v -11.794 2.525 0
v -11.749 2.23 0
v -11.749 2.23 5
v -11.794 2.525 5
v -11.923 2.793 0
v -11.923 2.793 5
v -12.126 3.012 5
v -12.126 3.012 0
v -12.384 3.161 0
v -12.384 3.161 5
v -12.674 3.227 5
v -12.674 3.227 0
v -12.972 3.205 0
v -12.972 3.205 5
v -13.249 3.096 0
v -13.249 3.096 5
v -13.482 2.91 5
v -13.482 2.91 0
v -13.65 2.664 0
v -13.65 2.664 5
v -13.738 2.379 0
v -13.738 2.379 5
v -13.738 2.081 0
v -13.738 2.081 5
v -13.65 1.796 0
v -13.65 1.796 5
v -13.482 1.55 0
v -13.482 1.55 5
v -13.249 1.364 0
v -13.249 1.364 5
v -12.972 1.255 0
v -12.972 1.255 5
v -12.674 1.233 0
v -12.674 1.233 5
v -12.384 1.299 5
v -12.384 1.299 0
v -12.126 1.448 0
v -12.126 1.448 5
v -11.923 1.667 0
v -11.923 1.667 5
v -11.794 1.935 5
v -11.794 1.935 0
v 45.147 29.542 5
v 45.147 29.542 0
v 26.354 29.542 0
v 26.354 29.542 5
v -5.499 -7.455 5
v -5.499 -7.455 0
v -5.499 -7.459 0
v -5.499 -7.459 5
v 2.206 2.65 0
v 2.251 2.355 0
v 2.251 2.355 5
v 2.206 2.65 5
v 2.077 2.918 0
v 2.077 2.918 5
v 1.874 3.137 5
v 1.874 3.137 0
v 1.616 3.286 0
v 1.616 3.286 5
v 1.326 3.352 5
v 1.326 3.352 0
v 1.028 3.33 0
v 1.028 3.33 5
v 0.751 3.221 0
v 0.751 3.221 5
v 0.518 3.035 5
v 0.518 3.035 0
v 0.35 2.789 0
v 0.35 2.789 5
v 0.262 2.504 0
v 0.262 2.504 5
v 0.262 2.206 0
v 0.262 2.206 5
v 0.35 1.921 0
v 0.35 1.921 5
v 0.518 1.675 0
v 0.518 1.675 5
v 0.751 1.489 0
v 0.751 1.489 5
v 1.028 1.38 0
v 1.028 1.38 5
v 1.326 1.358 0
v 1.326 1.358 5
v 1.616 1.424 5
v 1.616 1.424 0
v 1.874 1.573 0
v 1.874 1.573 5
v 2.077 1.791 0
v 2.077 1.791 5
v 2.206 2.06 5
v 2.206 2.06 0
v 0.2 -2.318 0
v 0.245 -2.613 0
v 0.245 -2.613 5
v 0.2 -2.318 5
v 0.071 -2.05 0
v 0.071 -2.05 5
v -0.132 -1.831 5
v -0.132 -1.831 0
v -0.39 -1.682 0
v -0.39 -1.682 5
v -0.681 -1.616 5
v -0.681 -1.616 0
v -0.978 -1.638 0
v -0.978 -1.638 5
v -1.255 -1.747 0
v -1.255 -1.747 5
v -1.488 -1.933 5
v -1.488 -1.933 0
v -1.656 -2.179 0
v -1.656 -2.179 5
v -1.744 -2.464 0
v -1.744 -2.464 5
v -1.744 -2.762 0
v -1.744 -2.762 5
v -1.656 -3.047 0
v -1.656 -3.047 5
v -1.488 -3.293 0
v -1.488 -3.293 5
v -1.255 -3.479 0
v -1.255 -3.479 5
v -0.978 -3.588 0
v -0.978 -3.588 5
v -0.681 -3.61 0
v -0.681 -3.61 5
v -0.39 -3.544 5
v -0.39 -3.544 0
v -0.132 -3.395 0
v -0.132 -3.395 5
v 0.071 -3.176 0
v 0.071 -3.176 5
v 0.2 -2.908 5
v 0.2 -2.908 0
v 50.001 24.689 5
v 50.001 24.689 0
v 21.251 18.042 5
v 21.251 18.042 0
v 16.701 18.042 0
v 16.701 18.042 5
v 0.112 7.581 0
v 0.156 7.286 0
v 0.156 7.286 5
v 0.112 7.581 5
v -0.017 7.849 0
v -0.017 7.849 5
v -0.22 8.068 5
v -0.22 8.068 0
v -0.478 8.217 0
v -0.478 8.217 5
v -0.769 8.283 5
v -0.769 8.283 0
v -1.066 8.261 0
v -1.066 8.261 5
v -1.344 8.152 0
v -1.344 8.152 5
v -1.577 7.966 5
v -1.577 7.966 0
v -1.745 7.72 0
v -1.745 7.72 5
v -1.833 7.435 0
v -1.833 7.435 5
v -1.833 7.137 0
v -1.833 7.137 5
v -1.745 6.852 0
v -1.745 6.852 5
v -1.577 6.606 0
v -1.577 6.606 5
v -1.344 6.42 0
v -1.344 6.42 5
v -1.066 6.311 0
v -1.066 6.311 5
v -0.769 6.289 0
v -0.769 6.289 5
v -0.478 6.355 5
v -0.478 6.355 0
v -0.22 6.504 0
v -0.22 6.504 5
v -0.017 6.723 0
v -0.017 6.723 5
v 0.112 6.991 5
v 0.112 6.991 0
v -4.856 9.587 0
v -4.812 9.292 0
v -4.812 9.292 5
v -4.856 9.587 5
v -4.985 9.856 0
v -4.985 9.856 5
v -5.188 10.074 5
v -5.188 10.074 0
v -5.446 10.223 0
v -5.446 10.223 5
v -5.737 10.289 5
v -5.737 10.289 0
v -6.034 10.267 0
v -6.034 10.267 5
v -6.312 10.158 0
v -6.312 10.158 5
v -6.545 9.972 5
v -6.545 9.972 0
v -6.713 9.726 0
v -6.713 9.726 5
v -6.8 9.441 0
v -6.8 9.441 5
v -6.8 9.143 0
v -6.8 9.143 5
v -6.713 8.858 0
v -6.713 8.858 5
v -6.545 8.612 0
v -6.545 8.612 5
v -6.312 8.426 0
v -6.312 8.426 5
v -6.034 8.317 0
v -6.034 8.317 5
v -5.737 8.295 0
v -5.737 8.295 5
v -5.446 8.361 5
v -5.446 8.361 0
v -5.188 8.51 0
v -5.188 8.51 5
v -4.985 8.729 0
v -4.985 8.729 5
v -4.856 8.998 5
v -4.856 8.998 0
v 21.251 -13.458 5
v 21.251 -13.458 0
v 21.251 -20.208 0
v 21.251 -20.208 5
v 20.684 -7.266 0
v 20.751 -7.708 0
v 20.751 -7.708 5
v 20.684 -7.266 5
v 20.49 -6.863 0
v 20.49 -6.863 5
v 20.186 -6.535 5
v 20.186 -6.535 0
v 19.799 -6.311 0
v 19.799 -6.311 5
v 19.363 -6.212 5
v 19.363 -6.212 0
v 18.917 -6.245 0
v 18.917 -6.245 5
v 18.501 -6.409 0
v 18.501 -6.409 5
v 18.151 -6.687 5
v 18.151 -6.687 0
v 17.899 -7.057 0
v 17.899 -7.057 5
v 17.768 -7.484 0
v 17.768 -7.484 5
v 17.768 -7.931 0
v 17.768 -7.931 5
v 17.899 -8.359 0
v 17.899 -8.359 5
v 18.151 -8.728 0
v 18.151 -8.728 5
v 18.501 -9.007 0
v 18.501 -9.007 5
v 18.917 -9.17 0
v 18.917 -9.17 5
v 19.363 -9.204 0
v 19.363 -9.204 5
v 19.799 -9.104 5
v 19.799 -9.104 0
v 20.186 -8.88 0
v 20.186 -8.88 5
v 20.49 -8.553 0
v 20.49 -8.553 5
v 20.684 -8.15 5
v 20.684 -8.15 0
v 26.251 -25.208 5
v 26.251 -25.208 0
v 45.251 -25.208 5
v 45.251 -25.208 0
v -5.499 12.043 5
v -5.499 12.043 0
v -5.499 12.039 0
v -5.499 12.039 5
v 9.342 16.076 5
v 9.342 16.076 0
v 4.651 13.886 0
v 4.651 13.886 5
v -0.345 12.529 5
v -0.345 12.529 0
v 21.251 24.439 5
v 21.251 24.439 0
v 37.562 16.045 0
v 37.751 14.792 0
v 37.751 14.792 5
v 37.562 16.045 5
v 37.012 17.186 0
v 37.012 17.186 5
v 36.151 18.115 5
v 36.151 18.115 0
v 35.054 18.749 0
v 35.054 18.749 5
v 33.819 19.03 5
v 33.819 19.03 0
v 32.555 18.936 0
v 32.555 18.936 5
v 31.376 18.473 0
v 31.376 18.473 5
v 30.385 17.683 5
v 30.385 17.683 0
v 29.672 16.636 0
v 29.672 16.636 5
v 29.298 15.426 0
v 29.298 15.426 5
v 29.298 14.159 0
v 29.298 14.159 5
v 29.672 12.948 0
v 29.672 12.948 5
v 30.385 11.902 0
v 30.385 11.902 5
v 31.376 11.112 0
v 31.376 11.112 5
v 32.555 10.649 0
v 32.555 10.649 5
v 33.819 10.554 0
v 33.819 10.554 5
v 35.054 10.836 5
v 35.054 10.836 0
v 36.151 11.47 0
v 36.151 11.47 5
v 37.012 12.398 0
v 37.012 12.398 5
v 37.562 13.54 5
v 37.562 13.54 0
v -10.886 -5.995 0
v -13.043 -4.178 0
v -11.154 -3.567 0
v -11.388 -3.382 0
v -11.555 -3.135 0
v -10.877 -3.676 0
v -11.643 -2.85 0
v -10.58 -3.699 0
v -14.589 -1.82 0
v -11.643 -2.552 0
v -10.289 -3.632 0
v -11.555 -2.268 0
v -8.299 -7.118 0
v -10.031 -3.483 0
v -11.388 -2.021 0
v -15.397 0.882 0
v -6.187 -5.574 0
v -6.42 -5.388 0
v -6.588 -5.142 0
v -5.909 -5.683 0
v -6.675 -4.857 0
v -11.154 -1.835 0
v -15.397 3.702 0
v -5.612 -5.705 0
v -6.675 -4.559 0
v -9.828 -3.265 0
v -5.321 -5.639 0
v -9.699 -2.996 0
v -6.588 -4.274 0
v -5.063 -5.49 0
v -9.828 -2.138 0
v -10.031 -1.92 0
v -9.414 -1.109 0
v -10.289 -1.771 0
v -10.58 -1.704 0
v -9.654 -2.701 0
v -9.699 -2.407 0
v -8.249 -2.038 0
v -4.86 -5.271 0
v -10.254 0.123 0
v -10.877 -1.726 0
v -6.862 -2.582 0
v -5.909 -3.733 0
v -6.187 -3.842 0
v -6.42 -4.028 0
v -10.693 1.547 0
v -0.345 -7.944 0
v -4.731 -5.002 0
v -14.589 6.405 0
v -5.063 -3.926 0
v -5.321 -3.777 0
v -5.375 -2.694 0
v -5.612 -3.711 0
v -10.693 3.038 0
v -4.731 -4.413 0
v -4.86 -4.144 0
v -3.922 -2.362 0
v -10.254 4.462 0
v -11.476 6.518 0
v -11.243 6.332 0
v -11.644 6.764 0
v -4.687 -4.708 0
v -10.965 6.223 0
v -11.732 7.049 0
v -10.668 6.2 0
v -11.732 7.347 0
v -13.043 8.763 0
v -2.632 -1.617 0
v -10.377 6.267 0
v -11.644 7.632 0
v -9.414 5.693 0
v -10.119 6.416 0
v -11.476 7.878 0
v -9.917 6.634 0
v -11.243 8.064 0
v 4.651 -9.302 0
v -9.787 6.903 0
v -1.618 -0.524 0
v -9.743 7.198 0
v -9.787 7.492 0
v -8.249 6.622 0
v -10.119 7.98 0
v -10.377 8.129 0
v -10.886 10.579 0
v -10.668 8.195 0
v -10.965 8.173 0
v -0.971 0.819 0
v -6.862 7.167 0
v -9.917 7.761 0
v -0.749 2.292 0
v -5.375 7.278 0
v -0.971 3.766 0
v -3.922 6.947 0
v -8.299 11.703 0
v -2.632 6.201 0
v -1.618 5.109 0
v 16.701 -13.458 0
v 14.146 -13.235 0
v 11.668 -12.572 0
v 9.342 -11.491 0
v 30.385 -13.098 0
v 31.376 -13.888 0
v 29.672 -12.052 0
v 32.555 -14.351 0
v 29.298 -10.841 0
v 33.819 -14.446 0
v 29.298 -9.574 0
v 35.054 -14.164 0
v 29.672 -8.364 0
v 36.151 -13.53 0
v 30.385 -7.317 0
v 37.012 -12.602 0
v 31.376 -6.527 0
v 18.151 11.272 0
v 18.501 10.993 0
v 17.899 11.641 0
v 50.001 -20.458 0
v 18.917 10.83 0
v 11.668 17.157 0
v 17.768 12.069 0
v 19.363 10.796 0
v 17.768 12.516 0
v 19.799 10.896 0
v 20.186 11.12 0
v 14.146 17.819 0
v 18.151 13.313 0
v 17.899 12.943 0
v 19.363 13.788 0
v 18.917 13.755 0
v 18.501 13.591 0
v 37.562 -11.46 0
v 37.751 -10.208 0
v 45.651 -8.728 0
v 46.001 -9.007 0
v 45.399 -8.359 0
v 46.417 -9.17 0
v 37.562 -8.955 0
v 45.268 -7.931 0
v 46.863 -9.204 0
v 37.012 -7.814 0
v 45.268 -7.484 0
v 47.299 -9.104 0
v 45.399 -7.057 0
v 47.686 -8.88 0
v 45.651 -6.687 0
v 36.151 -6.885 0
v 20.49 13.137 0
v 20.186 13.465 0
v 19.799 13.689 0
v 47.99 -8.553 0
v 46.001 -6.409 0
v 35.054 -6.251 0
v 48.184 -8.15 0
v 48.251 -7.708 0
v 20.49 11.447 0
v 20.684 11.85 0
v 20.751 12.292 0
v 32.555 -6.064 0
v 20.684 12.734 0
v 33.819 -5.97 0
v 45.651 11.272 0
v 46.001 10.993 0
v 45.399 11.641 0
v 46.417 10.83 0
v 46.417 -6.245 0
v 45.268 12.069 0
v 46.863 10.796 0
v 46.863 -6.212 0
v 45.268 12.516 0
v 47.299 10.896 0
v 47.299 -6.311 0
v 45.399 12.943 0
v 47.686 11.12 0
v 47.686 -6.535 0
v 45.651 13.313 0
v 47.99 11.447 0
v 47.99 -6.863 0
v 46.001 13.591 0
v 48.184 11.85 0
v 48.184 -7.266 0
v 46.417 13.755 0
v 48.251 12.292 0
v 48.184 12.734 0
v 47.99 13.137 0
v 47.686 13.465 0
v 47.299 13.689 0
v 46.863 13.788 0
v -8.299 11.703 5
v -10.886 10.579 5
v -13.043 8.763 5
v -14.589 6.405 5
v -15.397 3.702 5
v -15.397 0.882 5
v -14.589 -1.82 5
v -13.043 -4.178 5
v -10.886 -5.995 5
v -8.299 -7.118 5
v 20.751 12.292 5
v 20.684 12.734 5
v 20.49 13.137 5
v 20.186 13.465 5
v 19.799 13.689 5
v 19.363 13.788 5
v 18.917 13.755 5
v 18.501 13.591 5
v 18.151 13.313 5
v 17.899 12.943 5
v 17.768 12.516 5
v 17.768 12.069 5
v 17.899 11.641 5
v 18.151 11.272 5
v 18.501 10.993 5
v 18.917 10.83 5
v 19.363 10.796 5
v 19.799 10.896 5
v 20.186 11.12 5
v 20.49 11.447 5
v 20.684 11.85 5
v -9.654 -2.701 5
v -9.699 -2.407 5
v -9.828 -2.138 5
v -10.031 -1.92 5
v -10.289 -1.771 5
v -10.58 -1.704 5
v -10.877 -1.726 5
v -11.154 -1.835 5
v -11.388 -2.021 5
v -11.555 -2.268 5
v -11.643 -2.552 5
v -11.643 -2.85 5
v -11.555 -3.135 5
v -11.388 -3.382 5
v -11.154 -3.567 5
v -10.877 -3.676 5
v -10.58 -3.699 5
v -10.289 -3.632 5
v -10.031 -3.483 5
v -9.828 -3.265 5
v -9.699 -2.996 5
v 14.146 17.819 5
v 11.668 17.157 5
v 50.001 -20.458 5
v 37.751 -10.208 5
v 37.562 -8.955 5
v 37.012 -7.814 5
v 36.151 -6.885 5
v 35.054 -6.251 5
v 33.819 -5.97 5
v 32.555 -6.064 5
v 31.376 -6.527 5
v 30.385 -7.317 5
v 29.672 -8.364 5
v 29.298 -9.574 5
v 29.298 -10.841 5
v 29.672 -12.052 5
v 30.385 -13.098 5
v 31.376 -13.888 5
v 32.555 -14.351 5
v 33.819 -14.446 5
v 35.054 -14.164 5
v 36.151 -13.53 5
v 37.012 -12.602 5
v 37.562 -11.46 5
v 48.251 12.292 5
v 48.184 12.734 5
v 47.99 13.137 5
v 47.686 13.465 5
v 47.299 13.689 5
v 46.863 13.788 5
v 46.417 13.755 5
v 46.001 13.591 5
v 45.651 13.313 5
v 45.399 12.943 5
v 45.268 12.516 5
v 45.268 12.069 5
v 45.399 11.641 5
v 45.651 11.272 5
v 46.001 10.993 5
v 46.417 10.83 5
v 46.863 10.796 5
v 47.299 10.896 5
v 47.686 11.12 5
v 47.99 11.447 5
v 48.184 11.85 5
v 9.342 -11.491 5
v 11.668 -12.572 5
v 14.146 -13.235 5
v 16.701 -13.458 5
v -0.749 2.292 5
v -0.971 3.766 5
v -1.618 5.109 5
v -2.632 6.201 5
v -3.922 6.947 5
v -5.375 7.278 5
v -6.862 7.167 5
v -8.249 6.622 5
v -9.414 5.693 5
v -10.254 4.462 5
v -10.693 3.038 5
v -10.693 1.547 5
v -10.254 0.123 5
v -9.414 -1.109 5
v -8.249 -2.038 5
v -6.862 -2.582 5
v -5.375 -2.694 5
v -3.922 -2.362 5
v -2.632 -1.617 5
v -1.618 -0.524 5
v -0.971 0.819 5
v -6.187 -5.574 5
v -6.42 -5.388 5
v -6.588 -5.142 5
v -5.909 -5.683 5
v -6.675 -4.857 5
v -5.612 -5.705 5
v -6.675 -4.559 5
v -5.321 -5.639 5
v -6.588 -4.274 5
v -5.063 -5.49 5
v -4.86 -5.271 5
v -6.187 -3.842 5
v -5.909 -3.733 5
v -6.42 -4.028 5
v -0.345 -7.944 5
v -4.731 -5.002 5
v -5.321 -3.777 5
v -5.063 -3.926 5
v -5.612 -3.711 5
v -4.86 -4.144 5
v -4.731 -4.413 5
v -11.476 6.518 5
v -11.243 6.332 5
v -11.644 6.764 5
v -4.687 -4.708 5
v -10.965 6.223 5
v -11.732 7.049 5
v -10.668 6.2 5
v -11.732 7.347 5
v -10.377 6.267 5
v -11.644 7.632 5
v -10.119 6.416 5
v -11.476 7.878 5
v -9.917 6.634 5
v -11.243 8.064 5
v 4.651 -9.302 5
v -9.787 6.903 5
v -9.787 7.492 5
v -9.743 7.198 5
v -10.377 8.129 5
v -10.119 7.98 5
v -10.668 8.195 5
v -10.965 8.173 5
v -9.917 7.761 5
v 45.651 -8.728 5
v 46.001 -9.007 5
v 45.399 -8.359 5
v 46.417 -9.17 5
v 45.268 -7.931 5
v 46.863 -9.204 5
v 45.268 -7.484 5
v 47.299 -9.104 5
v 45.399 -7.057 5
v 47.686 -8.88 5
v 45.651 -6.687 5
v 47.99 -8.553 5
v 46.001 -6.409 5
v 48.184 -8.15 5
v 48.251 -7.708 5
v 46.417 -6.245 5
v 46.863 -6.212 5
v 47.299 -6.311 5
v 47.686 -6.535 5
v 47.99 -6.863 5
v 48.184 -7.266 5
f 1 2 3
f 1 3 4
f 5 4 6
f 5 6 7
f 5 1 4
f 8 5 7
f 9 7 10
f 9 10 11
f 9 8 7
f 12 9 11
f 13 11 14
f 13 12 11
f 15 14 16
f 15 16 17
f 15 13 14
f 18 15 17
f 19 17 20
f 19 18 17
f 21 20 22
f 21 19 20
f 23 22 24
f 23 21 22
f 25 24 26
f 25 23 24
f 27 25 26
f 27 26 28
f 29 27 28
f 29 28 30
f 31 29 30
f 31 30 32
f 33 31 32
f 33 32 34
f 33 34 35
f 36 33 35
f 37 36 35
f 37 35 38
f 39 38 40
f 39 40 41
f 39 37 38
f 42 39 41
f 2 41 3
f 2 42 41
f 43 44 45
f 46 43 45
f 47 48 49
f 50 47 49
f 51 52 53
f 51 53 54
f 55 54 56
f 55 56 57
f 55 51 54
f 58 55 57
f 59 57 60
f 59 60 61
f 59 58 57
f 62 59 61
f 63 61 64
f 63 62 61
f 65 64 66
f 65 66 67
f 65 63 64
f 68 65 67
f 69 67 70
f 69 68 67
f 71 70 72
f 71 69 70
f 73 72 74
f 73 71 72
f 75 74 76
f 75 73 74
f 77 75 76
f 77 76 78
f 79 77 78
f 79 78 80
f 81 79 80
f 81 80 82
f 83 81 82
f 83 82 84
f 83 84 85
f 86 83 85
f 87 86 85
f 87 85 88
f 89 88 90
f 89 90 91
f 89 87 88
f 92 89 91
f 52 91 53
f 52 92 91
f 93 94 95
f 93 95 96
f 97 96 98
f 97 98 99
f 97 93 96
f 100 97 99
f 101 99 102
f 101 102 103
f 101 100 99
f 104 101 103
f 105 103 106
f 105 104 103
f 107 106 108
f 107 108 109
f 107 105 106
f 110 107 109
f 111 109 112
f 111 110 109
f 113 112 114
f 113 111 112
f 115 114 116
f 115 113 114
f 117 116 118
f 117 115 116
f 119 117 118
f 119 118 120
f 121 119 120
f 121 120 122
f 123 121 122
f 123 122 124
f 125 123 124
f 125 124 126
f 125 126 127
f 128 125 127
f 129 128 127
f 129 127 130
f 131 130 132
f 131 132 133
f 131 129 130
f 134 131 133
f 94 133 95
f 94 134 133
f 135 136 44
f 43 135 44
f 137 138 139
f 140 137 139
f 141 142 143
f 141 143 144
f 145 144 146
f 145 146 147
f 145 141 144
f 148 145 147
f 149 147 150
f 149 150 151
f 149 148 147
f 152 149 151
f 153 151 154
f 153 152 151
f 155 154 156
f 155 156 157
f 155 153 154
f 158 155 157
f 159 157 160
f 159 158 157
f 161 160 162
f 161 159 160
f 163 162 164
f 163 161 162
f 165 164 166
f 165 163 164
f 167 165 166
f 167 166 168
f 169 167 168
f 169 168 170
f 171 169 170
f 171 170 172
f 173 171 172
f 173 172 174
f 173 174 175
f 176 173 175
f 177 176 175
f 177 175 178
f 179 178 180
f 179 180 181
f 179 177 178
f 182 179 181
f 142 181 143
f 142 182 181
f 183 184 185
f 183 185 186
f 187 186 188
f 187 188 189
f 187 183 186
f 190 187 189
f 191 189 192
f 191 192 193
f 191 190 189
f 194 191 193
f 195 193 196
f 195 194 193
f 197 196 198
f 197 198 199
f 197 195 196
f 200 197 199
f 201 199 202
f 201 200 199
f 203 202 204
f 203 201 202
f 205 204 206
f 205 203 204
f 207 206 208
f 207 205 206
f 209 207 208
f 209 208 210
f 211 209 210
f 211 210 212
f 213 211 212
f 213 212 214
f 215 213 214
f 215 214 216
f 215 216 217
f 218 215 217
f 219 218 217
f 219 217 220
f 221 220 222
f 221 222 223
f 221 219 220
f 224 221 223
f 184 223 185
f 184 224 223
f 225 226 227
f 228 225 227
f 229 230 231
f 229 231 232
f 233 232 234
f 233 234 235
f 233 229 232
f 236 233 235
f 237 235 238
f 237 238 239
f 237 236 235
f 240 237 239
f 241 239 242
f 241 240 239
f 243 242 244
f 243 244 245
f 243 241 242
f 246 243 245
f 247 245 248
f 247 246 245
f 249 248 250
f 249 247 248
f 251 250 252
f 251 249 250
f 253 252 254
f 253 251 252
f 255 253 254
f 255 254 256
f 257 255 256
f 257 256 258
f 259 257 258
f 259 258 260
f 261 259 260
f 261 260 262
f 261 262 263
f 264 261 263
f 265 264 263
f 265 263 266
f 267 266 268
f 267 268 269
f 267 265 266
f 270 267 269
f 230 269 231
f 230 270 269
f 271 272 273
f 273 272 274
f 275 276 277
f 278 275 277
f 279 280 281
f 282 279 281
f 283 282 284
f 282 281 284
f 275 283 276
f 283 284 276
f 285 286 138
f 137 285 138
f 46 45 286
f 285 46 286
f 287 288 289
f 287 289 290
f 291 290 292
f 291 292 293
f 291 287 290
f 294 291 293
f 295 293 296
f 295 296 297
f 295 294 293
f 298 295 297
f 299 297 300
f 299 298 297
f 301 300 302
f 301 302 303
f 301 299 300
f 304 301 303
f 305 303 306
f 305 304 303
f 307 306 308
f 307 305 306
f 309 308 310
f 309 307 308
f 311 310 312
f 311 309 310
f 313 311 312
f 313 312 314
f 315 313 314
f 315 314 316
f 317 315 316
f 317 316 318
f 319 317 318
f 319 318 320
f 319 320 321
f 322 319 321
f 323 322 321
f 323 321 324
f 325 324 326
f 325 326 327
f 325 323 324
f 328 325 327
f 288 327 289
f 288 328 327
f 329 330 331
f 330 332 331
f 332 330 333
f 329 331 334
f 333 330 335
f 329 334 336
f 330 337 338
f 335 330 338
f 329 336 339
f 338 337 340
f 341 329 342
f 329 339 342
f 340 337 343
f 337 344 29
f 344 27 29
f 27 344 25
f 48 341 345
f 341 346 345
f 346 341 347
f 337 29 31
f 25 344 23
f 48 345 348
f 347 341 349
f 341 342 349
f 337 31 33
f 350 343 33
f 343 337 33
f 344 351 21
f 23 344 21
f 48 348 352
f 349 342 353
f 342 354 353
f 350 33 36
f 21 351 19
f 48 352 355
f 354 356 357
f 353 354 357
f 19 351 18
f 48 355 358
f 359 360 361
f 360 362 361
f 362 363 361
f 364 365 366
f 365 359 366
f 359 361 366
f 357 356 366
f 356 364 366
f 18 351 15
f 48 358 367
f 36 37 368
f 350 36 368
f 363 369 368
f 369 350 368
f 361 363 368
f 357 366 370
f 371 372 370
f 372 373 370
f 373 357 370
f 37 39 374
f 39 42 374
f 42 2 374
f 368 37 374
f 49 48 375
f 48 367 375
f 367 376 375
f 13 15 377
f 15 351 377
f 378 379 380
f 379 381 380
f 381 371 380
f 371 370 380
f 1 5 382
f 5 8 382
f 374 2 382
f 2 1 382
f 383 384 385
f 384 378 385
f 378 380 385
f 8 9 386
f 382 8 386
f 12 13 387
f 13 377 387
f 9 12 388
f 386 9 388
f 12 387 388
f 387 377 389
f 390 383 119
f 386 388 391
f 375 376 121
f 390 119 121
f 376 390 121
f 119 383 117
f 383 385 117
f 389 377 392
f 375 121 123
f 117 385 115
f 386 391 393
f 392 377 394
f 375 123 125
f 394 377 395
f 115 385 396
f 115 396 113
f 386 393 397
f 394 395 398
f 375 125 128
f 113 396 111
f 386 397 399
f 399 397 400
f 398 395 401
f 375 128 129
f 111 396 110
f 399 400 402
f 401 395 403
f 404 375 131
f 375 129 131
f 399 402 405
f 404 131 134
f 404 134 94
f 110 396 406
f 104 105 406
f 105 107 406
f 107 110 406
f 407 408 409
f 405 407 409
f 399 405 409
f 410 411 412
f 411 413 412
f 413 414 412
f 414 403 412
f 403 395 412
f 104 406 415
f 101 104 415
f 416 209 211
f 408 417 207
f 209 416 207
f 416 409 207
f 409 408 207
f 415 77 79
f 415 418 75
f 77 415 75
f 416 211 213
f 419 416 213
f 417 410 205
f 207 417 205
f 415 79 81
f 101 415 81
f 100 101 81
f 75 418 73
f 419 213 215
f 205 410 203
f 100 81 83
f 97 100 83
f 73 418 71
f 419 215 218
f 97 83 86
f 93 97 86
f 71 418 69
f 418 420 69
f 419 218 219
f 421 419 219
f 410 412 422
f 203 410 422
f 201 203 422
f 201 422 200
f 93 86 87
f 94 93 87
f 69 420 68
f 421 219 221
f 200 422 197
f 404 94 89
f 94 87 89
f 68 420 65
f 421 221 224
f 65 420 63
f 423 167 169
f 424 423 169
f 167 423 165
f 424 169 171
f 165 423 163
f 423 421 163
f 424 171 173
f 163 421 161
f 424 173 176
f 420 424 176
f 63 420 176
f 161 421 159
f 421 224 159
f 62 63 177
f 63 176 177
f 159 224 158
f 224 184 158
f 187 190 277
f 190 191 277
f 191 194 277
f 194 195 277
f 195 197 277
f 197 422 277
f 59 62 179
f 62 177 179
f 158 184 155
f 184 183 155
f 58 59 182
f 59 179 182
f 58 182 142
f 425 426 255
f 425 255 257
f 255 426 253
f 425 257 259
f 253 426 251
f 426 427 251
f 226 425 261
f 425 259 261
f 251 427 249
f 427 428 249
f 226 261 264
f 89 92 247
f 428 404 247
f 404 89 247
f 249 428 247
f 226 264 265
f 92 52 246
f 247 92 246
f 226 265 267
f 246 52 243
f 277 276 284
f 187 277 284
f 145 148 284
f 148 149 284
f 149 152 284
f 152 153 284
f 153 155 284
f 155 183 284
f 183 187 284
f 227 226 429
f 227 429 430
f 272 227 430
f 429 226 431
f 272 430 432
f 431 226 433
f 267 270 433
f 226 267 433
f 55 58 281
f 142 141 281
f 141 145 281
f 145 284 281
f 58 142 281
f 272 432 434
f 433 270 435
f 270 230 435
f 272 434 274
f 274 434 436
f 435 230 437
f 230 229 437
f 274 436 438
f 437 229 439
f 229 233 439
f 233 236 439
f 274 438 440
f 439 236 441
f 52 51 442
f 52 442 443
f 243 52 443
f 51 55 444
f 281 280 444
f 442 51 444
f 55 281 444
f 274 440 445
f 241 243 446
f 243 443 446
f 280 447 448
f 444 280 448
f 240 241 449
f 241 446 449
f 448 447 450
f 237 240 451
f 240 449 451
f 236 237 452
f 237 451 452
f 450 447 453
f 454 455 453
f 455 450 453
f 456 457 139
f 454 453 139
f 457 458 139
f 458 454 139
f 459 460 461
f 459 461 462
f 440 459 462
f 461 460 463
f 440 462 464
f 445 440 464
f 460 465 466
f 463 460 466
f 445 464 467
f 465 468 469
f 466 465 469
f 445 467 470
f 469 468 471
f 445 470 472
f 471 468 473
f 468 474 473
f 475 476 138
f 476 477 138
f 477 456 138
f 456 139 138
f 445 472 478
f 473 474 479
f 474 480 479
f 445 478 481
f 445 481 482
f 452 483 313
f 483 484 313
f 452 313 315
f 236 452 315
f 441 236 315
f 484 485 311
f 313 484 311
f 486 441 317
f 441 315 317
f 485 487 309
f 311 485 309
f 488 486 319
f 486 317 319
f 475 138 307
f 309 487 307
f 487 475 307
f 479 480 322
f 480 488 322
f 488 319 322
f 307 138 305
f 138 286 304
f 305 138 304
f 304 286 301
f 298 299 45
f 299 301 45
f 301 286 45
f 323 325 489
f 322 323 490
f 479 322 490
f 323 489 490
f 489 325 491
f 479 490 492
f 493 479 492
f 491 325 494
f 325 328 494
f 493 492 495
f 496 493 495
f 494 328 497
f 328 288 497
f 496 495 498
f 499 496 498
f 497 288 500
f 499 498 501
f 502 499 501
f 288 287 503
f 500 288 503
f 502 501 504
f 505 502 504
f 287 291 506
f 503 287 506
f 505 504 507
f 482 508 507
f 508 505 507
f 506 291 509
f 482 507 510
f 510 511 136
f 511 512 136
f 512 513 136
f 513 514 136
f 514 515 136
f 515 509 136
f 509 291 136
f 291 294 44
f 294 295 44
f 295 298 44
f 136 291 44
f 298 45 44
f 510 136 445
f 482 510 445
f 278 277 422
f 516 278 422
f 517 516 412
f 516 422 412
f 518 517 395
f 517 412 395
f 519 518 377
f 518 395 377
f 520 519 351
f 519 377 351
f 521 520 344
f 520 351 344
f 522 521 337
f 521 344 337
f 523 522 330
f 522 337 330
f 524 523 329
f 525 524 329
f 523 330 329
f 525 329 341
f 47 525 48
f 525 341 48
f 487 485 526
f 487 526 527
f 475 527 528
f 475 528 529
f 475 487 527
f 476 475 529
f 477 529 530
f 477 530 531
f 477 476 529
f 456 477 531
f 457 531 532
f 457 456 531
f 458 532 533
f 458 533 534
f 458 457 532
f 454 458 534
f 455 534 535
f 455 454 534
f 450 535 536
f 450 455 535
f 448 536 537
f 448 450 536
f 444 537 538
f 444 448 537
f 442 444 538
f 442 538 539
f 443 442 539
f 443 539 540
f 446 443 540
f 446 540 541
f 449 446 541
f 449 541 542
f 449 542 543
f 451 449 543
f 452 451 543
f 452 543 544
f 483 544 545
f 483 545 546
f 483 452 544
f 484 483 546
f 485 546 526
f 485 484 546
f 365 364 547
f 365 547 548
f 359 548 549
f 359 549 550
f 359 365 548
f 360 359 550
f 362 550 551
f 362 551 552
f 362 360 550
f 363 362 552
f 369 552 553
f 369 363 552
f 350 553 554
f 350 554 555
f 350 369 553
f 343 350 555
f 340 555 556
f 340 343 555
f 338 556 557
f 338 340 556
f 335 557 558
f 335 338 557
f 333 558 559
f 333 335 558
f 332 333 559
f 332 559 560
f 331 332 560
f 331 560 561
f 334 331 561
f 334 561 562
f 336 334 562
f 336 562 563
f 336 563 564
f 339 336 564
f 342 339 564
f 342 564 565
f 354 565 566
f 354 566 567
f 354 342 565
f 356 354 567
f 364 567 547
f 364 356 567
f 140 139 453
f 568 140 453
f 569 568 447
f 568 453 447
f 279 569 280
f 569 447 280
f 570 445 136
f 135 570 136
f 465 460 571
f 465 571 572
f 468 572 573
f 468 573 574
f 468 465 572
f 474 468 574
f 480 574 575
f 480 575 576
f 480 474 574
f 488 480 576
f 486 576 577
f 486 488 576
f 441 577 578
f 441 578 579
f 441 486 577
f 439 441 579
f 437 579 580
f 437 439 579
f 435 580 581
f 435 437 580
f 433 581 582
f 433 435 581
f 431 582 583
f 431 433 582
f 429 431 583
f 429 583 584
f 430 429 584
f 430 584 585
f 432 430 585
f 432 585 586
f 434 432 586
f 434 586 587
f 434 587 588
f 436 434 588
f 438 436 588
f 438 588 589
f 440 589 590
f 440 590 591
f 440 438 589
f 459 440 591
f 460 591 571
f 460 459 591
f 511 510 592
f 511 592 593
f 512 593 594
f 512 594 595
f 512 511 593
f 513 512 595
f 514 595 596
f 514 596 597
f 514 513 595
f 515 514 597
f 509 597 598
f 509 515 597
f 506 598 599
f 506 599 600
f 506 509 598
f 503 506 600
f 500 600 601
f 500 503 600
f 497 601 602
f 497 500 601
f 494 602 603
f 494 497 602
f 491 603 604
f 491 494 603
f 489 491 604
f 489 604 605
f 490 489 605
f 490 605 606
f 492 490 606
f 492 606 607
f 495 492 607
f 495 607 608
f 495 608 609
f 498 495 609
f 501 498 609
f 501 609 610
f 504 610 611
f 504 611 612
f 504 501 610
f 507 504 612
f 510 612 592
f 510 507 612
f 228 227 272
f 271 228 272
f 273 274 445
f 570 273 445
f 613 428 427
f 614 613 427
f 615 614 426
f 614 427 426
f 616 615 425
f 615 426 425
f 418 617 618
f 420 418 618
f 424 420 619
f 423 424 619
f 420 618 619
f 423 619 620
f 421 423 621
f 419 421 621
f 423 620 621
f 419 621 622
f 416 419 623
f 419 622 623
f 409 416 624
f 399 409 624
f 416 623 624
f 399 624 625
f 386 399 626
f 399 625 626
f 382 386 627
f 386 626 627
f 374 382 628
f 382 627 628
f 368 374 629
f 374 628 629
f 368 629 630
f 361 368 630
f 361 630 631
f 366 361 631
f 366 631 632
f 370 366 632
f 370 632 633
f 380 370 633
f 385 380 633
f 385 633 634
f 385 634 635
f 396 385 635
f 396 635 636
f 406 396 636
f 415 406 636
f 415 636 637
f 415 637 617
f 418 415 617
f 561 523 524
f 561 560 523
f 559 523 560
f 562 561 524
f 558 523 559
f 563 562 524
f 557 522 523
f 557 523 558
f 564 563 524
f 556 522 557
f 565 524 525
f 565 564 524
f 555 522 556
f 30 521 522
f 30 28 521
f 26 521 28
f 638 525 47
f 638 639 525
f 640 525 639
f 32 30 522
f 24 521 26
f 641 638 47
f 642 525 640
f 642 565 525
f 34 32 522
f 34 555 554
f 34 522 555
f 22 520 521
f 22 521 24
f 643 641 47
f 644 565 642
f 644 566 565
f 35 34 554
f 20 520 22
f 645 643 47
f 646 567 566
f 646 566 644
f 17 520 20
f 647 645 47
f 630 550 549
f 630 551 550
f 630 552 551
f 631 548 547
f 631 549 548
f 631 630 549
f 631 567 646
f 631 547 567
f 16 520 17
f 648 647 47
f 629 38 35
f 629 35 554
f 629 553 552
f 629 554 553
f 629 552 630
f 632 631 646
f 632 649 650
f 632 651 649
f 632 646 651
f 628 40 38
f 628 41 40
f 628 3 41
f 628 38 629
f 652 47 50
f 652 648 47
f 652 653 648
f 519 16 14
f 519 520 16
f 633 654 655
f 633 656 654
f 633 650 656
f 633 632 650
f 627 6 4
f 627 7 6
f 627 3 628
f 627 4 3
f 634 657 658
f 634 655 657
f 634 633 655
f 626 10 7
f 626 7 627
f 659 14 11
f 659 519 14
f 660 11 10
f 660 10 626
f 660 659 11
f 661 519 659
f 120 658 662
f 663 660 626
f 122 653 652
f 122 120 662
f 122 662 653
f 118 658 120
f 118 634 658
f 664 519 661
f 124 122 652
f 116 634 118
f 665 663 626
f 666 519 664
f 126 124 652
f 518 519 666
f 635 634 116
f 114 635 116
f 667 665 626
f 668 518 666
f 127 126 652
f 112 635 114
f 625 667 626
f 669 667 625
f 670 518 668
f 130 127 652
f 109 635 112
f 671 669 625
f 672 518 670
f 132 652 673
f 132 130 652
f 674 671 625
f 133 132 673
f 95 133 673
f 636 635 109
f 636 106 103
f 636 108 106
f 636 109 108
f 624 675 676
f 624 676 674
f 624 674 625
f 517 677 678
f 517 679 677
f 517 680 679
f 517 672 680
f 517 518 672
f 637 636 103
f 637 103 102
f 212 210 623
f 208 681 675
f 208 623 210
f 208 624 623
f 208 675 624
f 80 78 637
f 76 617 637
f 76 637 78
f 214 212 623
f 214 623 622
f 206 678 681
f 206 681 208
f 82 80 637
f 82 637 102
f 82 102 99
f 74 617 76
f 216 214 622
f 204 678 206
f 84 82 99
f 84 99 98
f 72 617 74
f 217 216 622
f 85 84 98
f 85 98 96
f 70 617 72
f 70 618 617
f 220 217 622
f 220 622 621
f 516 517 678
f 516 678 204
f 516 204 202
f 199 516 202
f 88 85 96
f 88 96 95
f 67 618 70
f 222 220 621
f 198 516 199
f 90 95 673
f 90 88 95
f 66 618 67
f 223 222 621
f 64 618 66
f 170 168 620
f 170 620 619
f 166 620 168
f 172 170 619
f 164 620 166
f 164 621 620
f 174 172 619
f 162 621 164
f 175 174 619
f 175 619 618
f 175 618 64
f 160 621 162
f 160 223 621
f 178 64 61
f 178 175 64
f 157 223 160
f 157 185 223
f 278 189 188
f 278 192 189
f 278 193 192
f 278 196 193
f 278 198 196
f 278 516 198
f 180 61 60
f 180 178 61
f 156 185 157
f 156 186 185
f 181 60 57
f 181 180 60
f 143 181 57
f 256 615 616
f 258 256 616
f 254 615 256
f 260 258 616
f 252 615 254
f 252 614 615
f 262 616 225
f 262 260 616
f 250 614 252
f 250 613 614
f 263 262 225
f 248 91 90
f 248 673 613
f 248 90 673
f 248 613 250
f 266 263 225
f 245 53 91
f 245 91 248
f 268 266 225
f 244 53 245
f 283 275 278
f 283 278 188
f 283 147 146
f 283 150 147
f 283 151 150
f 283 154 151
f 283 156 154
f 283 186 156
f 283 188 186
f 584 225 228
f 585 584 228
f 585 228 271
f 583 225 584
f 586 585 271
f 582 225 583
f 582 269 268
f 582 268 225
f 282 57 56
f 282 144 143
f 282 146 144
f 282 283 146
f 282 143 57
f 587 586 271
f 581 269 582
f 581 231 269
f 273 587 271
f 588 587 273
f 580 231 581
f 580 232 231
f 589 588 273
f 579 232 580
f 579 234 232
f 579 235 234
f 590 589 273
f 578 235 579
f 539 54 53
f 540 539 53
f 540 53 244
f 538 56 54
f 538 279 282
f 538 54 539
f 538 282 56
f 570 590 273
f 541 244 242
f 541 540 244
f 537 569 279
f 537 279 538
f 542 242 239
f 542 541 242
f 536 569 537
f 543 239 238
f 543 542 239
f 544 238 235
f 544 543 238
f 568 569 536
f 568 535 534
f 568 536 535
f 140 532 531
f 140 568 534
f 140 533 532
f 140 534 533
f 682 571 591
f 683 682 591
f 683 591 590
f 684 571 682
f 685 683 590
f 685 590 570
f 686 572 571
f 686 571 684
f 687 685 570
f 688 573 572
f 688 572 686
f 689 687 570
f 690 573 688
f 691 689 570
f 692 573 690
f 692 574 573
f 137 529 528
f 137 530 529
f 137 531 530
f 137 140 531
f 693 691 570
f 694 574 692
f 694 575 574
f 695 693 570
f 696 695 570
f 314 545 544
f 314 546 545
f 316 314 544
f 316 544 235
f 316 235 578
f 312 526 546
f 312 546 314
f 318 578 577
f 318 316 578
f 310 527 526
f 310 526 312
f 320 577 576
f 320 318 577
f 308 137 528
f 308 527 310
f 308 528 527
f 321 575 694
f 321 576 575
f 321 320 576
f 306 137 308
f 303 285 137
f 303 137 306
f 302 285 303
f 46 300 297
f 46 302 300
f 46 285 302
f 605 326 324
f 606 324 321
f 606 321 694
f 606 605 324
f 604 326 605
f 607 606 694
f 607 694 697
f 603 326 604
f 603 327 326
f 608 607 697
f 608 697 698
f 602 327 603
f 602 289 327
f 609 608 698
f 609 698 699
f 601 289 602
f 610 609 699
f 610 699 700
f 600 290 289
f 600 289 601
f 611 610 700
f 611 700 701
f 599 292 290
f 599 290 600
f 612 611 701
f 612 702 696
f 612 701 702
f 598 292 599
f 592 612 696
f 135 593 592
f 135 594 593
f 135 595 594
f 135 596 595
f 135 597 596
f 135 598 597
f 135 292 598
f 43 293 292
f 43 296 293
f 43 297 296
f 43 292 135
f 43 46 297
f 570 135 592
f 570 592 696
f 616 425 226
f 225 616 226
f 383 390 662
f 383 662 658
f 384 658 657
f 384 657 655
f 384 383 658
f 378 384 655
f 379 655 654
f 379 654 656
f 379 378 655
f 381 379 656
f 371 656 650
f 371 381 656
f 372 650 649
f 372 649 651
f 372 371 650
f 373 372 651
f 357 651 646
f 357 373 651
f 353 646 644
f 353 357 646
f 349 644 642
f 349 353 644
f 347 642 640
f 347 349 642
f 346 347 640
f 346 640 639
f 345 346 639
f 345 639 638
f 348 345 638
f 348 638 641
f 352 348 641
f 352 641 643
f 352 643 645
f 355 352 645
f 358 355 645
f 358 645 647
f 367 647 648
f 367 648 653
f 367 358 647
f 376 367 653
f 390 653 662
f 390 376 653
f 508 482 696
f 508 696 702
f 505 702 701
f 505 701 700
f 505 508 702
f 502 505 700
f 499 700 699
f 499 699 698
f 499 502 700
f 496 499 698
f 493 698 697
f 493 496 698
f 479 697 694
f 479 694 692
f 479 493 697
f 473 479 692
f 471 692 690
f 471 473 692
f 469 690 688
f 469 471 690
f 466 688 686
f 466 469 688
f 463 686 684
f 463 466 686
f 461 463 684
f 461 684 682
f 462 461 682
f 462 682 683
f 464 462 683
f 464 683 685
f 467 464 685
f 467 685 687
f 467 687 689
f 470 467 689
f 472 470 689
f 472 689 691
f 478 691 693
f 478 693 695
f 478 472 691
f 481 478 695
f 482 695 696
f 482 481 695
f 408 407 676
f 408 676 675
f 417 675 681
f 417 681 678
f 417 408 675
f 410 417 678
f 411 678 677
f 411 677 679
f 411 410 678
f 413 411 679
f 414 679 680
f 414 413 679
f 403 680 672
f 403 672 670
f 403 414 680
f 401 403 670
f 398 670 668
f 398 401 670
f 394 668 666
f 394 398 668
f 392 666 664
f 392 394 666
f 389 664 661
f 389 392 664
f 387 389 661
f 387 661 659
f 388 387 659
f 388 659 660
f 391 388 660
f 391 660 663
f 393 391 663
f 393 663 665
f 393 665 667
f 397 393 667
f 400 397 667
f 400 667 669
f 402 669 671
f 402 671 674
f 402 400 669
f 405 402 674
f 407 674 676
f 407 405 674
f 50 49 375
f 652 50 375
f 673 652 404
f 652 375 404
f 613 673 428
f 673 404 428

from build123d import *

# Parameters (mm, degrees)
SKETCH1_R           = 1.5
SKETCH1_R_2         = 4.25
SKETCH1_R_3         = 1
BOSS_EXTRUDE2_DEPTH = 5
SKETCH2_R           = 5
CUT_EXTRUDE1_DEPTH  = 10


with BuildPart() as part:
    # Sketch1 → Boss-Extrude2 (new body)
    with BuildSketch(Plane.XY):
        with BuildLine():
            Line((45.25091594, -25.207708346), (50.00091594, -20.457708346))
            Line((50.00091594, -20.457708346), (50.00091594, 24.688738263))
            Line((50.00091594, 24.688738263), (45.147362549, 29.542291654))
            Line((45.147362549, 29.542291654), (26.35446933, 29.542291654))
            Line((26.35446933, 29.542291654), (21.25091594, 24.438738263))
            Line((21.25091594, 24.438738263), (21.25091594, 18.042291654))
            Line((21.25091594, 18.042291654), (20.408095363, 18.042291654))
            Line((20.408095363, 18.042291654), (16.70086026, 18.042291654))
            ThreePointArc((16.70086026, 18.042291654), (12.892426636, 17.542145454), (9.3422674, 16.075624987))
            ThreePointArc((9.3422674, 16.075624987), (2.182128173, 13.100539865), (-5.49908406, 12.043324729))
            Line((-5.49908406, 12.043324729), (-5.49908406, 12.039085999))
            ThreePointArc((-5.49908406, 12.039085999), (-15.49908406, 2.292291654), (-5.49908406, -7.454502691))
            Line((-5.49908406, -7.454502691), (-5.49908406, -7.458741422))
            ThreePointArc((-5.49908406, -7.458741422), (2.182128173, -8.515956557), (9.3422674, -11.491041679))
            ThreePointArc((9.3422674, -11.491041679), (12.892426636, -12.957562146), (16.70086026, -13.457708346))
            Line((16.70086026, -13.457708346), (20.408095363, -13.457708346))
            Line((20.408095363, -13.457708346), (21.25091594, -13.457708346))
            Line((21.25091594, -13.457708346), (21.25091594, -20.207708346))
            Line((21.25091594, -20.207708346), (26.25091594, -25.207708346))
            Line((26.25091594, -25.207708346), (45.25091594, -25.207708346))
        make_face()
        with Locations((46.75091594, -7.707708346)):
            Circle(SKETCH1_R, mode=Mode.SUBTRACT)
        with Locations((46.75091594, 12.292291654)):
            Circle(SKETCH1_R, mode=Mode.SUBTRACT)
        with Locations((33.50091594, 14.792291654)):
            Circle(SKETCH1_R_2, mode=Mode.SUBTRACT)
        with Locations((33.50091594, -10.207708346)):
            Circle(SKETCH1_R_2, mode=Mode.SUBTRACT)
        with Locations((19.25091594, 12.292291654)):
            Circle(SKETCH1_R, mode=Mode.SUBTRACT)
        with Locations((19.25091594, -7.707708346)):
            Circle(SKETCH1_R, mode=Mode.SUBTRACT)
        with Locations((-5.74908406, 2.292291654)):
            Circle(SKETCH1_R, mode=Mode.SUBTRACT)
        with Locations((1.25091594, 2.354746229)):
            Circle(SKETCH1_R_3, mode=Mode.SUBTRACT)
        with Locations((-0.755373293, -2.613098521)):
            Circle(SKETCH1_R_3, mode=Mode.SUBTRACT)
        with Locations((-5.686629485, -4.707708346)):
            Circle(SKETCH1_R_3, mode=Mode.SUBTRACT)
        with Locations((-10.654474236, -2.701419114)):
            Circle(SKETCH1_R_3, mode=Mode.SUBTRACT)
        with Locations((-12.74908406, 2.229837079)):
            Circle(SKETCH1_R_3, mode=Mode.SUBTRACT)
        with Locations((-10.742794828, 7.197681829)):
            Circle(SKETCH1_R_3, mode=Mode.SUBTRACT)
        with Locations((-5.811538636, 9.292291654)):
            Circle(SKETCH1_R_3, mode=Mode.SUBTRACT)
        with Locations((-0.843693885, 7.286002421)):
            Circle(SKETCH1_R_3, mode=Mode.SUBTRACT)
    extrude(amount=BOSS_EXTRUDE2_DEPTH)

    # Sketch2 → Cut-Extrude1 (cut)
    with BuildSketch(Plane.XY.offset(5)):
        with Locations((-5.74908406, 2.292291654)):
            Circle(SKETCH2_R)
    extrude(amount=-CUT_EXTRUDE1_DEPTH, mode=Mode.SUBTRACT)


solid = part.part
